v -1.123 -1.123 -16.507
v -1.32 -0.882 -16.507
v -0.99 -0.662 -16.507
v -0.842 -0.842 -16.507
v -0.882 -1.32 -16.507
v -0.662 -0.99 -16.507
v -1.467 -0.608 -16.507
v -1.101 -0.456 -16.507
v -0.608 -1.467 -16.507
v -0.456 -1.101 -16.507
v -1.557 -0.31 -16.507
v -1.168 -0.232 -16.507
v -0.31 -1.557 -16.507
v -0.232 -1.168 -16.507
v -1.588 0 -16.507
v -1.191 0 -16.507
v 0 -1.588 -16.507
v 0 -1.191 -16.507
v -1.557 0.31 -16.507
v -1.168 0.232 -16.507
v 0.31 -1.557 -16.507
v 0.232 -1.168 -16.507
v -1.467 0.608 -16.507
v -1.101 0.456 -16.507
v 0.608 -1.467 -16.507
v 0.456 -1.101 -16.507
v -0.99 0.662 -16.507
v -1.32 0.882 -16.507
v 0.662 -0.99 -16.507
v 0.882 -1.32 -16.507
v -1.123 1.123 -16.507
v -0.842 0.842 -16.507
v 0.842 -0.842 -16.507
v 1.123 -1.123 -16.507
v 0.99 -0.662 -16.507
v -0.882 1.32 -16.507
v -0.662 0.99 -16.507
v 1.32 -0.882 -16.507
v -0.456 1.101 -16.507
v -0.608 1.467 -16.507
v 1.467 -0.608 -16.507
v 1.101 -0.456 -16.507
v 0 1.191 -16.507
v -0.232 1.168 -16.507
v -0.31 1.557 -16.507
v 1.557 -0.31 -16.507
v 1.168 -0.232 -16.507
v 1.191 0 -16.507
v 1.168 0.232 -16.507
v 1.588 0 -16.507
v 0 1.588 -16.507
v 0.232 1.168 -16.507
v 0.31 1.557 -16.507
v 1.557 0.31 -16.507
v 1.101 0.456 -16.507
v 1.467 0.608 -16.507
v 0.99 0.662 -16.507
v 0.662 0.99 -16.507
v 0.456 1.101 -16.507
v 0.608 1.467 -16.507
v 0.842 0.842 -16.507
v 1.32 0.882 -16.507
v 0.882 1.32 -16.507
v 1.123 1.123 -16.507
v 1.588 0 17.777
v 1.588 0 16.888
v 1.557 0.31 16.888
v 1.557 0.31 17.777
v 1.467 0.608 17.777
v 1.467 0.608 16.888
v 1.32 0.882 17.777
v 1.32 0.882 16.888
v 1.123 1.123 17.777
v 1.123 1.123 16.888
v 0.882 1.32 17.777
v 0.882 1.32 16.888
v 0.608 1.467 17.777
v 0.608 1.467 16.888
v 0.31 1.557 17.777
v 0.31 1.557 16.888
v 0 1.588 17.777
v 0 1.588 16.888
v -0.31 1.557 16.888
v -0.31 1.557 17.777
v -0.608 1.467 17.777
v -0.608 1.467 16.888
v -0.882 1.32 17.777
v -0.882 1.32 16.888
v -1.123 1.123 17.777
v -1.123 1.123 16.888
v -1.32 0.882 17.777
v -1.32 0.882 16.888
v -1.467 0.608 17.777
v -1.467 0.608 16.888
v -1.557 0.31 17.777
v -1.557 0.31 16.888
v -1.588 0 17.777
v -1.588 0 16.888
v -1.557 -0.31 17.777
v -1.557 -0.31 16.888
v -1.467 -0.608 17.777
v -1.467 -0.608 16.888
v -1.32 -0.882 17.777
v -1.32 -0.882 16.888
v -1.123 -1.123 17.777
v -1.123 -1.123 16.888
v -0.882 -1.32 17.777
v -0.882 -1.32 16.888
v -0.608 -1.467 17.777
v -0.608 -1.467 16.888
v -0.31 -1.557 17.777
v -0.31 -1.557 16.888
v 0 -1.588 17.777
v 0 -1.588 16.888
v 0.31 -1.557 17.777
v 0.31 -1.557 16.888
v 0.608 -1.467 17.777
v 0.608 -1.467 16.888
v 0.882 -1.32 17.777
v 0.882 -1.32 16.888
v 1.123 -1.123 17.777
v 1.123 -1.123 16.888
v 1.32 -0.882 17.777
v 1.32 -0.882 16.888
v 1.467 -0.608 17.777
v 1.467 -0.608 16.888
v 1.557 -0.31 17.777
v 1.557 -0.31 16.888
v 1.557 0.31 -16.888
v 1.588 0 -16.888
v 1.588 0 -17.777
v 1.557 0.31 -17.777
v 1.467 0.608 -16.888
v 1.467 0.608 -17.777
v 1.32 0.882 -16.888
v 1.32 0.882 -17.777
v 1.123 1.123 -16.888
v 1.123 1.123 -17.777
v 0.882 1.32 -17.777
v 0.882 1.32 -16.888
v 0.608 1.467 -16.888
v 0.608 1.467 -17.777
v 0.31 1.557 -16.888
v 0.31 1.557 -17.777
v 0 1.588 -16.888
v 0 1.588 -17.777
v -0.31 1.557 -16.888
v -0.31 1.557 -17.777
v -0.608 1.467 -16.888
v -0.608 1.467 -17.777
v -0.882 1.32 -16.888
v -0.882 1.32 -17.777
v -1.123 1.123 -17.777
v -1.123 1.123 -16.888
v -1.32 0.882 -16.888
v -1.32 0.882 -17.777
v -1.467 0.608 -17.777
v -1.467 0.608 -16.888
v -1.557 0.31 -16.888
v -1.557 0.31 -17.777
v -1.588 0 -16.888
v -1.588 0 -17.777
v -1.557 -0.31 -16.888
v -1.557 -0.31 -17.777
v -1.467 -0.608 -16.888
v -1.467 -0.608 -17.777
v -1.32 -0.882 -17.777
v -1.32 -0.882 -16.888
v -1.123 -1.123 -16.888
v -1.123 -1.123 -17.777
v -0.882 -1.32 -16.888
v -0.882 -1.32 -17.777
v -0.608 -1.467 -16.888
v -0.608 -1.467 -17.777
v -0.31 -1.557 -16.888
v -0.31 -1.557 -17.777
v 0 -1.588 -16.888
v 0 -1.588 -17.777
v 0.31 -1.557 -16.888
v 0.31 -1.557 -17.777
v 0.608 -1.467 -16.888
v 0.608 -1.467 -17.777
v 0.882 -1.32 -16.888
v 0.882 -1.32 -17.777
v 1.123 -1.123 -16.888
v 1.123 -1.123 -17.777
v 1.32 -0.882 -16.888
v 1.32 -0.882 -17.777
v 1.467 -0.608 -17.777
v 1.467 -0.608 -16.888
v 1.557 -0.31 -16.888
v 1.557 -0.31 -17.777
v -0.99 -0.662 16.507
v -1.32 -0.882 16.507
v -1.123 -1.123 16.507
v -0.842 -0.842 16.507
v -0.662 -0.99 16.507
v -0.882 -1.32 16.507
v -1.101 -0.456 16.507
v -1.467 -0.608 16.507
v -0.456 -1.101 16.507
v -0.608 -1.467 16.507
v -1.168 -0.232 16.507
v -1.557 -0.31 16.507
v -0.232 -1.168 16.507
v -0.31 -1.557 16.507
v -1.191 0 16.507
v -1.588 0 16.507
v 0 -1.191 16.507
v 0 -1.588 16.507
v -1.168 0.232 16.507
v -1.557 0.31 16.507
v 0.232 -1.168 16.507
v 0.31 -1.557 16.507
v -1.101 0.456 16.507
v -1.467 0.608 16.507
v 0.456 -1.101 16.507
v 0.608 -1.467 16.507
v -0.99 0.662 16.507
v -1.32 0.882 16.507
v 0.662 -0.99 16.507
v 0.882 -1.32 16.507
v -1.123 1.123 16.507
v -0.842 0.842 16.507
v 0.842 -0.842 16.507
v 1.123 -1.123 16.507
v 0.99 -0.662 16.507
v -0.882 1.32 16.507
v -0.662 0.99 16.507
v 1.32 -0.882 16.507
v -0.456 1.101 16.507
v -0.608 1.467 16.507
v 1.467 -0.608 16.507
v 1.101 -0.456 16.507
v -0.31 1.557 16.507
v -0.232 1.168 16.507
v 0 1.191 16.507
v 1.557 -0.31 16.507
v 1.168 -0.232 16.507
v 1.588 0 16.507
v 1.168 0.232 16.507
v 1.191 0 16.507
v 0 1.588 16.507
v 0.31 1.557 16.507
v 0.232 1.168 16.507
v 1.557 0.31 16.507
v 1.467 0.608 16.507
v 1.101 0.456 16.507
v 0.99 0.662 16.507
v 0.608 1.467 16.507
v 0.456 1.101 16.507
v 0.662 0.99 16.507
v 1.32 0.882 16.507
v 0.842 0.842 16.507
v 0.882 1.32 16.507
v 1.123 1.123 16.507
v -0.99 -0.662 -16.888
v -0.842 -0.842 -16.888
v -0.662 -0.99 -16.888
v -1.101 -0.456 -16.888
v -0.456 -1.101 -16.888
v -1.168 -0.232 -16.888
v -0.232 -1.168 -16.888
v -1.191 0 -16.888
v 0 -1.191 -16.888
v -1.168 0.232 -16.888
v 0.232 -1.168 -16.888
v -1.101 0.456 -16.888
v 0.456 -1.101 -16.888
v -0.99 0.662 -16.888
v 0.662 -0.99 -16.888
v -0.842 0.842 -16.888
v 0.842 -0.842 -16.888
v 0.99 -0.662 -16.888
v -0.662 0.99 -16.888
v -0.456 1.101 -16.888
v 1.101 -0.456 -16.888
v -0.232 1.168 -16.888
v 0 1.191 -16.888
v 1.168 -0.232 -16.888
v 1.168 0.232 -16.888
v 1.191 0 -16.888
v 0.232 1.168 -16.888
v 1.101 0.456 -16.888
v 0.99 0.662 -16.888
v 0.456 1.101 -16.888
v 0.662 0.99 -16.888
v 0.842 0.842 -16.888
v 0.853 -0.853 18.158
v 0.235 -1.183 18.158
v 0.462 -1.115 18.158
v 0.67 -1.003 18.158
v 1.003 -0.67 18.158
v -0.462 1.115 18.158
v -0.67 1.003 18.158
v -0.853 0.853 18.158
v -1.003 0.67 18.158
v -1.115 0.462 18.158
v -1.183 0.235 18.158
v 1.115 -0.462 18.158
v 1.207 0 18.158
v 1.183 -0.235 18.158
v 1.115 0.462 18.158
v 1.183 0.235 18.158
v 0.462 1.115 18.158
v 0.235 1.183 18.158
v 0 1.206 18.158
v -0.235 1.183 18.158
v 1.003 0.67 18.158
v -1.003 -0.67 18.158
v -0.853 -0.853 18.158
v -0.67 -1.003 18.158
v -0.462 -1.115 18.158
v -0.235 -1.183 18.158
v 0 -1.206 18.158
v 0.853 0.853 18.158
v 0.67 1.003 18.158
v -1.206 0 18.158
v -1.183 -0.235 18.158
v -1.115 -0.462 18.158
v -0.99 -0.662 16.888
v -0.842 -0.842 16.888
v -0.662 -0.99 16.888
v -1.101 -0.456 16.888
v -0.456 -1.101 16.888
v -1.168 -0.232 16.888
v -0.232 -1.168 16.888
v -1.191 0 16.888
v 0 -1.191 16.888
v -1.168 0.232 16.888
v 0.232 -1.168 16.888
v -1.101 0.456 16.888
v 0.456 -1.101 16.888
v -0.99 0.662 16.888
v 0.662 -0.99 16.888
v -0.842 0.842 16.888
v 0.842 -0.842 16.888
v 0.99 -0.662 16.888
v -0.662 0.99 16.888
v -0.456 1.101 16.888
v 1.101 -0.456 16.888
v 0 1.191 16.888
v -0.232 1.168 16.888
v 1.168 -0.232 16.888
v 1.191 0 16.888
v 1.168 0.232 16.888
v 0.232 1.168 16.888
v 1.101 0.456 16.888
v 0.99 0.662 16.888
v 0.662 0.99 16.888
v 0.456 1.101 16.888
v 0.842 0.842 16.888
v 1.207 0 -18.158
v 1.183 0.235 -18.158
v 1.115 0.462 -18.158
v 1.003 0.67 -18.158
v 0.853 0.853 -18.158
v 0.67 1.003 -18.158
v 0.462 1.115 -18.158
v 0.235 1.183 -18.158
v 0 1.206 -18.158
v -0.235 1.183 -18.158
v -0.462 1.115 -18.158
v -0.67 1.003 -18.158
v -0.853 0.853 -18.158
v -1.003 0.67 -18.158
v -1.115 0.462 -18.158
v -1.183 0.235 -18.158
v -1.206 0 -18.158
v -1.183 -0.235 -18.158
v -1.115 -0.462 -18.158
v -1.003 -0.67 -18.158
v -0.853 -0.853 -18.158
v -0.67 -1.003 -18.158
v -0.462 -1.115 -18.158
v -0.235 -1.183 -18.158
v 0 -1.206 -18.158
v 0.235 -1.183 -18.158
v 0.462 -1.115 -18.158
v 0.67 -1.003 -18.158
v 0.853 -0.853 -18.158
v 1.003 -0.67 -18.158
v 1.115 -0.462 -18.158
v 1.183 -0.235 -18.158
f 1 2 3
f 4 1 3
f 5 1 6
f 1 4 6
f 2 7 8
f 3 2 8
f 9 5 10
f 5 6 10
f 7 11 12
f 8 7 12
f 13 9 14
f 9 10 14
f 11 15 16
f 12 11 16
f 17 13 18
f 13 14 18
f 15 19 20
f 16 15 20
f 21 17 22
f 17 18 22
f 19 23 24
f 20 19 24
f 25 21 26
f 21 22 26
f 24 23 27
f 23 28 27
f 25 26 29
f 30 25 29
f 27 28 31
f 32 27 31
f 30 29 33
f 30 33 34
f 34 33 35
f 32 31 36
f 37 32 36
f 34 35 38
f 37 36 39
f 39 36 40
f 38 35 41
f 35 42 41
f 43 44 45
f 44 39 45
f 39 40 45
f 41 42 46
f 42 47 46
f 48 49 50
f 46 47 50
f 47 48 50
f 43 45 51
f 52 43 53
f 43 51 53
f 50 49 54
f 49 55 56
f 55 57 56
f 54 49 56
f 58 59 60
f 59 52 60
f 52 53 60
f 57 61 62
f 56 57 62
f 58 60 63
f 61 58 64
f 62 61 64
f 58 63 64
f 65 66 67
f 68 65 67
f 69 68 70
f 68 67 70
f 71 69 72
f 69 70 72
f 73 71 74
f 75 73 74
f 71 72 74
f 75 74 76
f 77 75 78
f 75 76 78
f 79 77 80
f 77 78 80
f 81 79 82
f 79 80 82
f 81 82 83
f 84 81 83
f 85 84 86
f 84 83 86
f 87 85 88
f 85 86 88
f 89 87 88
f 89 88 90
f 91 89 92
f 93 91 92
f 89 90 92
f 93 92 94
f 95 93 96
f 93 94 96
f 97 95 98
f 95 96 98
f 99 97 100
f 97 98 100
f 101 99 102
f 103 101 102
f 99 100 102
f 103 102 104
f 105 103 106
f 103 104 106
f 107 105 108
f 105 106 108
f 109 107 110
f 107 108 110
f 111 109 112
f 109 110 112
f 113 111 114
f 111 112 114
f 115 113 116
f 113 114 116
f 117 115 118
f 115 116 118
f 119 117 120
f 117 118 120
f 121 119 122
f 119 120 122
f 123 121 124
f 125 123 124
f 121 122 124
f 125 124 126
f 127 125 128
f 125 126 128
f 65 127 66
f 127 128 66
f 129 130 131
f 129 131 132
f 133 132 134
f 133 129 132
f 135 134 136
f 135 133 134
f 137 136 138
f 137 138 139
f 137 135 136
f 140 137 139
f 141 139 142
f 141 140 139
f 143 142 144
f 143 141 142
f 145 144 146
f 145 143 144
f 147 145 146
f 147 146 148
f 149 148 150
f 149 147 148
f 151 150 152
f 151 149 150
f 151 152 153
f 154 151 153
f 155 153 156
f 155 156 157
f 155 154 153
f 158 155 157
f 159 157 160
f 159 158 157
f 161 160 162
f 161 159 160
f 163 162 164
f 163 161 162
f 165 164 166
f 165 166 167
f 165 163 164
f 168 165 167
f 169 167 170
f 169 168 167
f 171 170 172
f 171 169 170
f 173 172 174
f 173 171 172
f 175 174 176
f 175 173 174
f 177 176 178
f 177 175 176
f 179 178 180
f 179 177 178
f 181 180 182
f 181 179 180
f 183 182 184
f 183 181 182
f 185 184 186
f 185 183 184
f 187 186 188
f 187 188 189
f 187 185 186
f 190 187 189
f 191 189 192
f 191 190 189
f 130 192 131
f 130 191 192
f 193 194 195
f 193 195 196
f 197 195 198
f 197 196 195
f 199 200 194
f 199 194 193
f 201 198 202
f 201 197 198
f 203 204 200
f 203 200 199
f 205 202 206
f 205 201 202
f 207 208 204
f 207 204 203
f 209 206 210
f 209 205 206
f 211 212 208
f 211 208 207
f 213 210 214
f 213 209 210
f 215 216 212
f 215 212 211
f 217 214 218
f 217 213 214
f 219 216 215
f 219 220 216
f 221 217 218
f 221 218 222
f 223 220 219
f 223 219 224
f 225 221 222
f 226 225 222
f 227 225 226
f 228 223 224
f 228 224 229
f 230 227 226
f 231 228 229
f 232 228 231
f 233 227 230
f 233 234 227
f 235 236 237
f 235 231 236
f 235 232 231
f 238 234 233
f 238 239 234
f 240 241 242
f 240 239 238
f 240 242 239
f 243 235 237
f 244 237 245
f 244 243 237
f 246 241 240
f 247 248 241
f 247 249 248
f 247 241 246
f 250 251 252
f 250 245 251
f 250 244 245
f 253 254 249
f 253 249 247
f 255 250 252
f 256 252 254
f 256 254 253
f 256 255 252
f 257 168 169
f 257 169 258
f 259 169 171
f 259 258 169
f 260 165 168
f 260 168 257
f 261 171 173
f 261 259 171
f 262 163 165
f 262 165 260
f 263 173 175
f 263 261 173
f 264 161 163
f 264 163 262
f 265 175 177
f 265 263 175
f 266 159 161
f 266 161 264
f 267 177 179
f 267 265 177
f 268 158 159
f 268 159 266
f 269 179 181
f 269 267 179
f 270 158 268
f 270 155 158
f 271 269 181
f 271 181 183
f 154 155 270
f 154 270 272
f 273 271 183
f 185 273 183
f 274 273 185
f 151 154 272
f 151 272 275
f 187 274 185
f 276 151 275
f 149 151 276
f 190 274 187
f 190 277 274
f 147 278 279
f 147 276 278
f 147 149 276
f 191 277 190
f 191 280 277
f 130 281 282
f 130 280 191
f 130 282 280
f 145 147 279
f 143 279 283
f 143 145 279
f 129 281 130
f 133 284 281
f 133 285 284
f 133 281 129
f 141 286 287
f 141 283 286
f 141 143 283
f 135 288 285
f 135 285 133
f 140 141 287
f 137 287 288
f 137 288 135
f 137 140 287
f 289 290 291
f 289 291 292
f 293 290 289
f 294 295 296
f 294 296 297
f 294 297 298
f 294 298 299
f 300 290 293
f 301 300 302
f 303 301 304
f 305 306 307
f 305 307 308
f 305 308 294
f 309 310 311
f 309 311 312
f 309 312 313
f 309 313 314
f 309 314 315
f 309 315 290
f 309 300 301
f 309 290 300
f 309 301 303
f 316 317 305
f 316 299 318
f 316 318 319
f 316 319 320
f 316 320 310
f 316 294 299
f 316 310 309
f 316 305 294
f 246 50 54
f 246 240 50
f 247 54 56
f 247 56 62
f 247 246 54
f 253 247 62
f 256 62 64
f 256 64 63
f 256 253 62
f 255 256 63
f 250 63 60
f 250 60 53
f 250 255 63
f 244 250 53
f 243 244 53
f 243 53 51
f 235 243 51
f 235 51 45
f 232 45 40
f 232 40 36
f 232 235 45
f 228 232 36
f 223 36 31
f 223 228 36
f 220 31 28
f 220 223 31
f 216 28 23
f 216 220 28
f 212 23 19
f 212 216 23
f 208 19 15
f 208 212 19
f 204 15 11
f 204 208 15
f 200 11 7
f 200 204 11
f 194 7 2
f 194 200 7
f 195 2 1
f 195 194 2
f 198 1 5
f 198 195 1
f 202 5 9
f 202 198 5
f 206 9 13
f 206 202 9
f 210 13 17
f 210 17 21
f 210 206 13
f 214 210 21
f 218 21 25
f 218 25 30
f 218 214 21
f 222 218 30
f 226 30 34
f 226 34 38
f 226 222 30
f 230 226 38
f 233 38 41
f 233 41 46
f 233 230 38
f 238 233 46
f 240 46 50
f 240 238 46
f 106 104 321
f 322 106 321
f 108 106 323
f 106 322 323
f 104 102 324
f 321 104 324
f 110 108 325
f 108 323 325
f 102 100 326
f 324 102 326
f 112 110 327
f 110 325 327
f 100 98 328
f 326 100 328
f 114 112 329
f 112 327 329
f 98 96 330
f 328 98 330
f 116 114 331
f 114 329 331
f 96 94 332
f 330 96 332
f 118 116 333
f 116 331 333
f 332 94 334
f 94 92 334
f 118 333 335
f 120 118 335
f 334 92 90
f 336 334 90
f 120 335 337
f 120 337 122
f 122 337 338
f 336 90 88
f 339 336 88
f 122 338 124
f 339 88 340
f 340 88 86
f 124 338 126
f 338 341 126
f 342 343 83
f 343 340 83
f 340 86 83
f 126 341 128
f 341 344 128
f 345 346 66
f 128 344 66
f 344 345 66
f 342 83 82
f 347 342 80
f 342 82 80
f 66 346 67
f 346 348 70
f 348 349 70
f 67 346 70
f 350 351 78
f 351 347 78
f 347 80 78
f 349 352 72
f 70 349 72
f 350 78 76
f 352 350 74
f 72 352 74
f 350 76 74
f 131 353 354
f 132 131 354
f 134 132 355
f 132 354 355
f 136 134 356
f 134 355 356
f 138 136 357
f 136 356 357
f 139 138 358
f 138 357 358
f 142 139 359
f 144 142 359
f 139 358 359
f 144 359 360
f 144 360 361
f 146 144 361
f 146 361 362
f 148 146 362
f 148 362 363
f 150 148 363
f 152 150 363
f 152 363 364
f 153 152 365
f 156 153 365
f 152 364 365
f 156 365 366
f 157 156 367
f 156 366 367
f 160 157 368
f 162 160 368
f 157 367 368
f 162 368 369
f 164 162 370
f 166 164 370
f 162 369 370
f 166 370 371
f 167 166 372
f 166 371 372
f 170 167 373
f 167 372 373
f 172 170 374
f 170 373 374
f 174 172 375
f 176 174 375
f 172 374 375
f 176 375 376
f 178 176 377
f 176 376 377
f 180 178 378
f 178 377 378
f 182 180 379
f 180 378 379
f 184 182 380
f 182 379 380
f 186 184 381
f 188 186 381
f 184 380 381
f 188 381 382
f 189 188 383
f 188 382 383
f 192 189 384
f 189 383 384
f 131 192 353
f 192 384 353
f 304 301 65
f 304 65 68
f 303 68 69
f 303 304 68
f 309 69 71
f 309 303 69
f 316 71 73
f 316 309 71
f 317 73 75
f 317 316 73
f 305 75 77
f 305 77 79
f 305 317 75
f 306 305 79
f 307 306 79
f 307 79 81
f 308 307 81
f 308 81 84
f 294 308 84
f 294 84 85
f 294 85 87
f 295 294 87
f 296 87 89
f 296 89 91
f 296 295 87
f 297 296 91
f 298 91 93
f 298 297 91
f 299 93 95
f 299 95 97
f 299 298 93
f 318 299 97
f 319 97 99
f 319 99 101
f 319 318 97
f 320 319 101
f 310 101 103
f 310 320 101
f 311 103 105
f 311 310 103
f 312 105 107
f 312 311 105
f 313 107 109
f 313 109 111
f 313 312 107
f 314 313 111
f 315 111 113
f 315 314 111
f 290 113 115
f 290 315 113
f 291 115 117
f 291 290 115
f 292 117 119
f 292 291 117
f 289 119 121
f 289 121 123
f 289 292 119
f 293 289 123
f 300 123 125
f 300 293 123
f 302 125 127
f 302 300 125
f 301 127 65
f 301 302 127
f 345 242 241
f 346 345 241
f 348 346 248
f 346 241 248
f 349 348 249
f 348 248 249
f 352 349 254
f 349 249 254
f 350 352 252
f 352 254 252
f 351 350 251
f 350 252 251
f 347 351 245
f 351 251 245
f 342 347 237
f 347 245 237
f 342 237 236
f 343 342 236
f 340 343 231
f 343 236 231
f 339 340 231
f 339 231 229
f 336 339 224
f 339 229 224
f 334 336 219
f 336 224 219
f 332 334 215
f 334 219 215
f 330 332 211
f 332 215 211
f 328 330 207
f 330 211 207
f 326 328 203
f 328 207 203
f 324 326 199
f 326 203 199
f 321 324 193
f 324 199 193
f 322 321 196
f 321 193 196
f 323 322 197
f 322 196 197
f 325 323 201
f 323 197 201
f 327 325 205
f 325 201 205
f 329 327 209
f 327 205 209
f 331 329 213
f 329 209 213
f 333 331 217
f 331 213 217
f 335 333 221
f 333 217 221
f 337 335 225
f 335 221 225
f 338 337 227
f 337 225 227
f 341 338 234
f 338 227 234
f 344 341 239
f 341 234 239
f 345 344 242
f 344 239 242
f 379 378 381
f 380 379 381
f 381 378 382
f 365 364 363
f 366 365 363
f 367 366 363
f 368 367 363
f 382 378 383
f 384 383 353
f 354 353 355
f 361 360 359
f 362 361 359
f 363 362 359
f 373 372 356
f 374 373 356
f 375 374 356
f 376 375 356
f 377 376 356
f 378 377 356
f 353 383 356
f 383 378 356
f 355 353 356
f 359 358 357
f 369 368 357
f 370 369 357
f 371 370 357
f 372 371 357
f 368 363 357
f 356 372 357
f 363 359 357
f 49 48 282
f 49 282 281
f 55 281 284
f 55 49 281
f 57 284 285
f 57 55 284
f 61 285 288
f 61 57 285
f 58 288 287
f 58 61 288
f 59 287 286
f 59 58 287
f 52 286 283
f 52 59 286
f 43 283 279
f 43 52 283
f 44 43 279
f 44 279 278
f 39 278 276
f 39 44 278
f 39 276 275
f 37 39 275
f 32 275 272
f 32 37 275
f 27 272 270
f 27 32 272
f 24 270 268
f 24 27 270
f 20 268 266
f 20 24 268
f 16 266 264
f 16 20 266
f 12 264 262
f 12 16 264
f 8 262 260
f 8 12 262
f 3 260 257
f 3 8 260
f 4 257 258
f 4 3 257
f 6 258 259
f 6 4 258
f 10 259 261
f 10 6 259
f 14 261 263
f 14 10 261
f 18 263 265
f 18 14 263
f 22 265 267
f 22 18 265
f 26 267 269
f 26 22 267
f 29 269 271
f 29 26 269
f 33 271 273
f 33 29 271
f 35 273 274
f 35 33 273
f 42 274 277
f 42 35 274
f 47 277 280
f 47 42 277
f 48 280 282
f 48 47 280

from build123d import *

# Parameters (mm, degrees)
SKETCH1_R                = 1.5875
BOSS_EXTRUDE1_DEPTH      = 16.50746
SKETCH2_R                = 1.19126
BOSS_EXTRUDE2_DEPTH      = 0.381
SKETCH3_R                = 1.5875
BOSS_EXTRUDE3_DEPTH      = 1.27
CHAMFER1_SIZE            = 0.381
CHAMFER1_OF_MIRROR1_SIZE = 0.381


with BuildPart() as part:
    # Sketch1 → Boss-Extrude1 (new body, symmetric)
    with BuildSketch(Plane.XY):
        Circle(SKETCH1_R)
    extrude(amount=BOSS_EXTRUDE1_DEPTH, both=True)

    # Sketch2 → Boss-Extrude2 (add)
    with BuildSketch(Plane.XY.offset(16.50746)):
        Circle(SKETCH2_R)
    boss_extrude2 = extrude(amount=BOSS_EXTRUDE2_DEPTH)

    # Sketch3 → Boss-Extrude3 (add)
    with BuildSketch(Plane.XY.offset(16.88846)):
        Circle(SKETCH3_R)
    boss_extrude3 = extrude(amount=BOSS_EXTRUDE3_DEPTH)

    # Chamfer1
    chamfer1_edges = [part.edges().sort_by_distance(p)[0] for p in [
        (-1.5875, 0, 18.15846),
    ]]
    chamfer(chamfer1_edges, length=CHAMFER1_SIZE)

    # Mirror1: Boss-Extrude2, Boss-Extrude3 across plane
    add(boss_extrude2.mirror(Plane.XY))
    add(boss_extrude3.mirror(Plane.XY))

    # Chamfer1 of Mirror1
    chamfer1_of_mirror1_edges = [part.edges().sort_by_distance(p)[0] for p in [
        (-1.5875, 0, -18.15846),
    ]]
    chamfer(chamfer1_of_mirror1_edges, length=CHAMFER1_OF_MIRROR1_SIZE)


solid = part.part
